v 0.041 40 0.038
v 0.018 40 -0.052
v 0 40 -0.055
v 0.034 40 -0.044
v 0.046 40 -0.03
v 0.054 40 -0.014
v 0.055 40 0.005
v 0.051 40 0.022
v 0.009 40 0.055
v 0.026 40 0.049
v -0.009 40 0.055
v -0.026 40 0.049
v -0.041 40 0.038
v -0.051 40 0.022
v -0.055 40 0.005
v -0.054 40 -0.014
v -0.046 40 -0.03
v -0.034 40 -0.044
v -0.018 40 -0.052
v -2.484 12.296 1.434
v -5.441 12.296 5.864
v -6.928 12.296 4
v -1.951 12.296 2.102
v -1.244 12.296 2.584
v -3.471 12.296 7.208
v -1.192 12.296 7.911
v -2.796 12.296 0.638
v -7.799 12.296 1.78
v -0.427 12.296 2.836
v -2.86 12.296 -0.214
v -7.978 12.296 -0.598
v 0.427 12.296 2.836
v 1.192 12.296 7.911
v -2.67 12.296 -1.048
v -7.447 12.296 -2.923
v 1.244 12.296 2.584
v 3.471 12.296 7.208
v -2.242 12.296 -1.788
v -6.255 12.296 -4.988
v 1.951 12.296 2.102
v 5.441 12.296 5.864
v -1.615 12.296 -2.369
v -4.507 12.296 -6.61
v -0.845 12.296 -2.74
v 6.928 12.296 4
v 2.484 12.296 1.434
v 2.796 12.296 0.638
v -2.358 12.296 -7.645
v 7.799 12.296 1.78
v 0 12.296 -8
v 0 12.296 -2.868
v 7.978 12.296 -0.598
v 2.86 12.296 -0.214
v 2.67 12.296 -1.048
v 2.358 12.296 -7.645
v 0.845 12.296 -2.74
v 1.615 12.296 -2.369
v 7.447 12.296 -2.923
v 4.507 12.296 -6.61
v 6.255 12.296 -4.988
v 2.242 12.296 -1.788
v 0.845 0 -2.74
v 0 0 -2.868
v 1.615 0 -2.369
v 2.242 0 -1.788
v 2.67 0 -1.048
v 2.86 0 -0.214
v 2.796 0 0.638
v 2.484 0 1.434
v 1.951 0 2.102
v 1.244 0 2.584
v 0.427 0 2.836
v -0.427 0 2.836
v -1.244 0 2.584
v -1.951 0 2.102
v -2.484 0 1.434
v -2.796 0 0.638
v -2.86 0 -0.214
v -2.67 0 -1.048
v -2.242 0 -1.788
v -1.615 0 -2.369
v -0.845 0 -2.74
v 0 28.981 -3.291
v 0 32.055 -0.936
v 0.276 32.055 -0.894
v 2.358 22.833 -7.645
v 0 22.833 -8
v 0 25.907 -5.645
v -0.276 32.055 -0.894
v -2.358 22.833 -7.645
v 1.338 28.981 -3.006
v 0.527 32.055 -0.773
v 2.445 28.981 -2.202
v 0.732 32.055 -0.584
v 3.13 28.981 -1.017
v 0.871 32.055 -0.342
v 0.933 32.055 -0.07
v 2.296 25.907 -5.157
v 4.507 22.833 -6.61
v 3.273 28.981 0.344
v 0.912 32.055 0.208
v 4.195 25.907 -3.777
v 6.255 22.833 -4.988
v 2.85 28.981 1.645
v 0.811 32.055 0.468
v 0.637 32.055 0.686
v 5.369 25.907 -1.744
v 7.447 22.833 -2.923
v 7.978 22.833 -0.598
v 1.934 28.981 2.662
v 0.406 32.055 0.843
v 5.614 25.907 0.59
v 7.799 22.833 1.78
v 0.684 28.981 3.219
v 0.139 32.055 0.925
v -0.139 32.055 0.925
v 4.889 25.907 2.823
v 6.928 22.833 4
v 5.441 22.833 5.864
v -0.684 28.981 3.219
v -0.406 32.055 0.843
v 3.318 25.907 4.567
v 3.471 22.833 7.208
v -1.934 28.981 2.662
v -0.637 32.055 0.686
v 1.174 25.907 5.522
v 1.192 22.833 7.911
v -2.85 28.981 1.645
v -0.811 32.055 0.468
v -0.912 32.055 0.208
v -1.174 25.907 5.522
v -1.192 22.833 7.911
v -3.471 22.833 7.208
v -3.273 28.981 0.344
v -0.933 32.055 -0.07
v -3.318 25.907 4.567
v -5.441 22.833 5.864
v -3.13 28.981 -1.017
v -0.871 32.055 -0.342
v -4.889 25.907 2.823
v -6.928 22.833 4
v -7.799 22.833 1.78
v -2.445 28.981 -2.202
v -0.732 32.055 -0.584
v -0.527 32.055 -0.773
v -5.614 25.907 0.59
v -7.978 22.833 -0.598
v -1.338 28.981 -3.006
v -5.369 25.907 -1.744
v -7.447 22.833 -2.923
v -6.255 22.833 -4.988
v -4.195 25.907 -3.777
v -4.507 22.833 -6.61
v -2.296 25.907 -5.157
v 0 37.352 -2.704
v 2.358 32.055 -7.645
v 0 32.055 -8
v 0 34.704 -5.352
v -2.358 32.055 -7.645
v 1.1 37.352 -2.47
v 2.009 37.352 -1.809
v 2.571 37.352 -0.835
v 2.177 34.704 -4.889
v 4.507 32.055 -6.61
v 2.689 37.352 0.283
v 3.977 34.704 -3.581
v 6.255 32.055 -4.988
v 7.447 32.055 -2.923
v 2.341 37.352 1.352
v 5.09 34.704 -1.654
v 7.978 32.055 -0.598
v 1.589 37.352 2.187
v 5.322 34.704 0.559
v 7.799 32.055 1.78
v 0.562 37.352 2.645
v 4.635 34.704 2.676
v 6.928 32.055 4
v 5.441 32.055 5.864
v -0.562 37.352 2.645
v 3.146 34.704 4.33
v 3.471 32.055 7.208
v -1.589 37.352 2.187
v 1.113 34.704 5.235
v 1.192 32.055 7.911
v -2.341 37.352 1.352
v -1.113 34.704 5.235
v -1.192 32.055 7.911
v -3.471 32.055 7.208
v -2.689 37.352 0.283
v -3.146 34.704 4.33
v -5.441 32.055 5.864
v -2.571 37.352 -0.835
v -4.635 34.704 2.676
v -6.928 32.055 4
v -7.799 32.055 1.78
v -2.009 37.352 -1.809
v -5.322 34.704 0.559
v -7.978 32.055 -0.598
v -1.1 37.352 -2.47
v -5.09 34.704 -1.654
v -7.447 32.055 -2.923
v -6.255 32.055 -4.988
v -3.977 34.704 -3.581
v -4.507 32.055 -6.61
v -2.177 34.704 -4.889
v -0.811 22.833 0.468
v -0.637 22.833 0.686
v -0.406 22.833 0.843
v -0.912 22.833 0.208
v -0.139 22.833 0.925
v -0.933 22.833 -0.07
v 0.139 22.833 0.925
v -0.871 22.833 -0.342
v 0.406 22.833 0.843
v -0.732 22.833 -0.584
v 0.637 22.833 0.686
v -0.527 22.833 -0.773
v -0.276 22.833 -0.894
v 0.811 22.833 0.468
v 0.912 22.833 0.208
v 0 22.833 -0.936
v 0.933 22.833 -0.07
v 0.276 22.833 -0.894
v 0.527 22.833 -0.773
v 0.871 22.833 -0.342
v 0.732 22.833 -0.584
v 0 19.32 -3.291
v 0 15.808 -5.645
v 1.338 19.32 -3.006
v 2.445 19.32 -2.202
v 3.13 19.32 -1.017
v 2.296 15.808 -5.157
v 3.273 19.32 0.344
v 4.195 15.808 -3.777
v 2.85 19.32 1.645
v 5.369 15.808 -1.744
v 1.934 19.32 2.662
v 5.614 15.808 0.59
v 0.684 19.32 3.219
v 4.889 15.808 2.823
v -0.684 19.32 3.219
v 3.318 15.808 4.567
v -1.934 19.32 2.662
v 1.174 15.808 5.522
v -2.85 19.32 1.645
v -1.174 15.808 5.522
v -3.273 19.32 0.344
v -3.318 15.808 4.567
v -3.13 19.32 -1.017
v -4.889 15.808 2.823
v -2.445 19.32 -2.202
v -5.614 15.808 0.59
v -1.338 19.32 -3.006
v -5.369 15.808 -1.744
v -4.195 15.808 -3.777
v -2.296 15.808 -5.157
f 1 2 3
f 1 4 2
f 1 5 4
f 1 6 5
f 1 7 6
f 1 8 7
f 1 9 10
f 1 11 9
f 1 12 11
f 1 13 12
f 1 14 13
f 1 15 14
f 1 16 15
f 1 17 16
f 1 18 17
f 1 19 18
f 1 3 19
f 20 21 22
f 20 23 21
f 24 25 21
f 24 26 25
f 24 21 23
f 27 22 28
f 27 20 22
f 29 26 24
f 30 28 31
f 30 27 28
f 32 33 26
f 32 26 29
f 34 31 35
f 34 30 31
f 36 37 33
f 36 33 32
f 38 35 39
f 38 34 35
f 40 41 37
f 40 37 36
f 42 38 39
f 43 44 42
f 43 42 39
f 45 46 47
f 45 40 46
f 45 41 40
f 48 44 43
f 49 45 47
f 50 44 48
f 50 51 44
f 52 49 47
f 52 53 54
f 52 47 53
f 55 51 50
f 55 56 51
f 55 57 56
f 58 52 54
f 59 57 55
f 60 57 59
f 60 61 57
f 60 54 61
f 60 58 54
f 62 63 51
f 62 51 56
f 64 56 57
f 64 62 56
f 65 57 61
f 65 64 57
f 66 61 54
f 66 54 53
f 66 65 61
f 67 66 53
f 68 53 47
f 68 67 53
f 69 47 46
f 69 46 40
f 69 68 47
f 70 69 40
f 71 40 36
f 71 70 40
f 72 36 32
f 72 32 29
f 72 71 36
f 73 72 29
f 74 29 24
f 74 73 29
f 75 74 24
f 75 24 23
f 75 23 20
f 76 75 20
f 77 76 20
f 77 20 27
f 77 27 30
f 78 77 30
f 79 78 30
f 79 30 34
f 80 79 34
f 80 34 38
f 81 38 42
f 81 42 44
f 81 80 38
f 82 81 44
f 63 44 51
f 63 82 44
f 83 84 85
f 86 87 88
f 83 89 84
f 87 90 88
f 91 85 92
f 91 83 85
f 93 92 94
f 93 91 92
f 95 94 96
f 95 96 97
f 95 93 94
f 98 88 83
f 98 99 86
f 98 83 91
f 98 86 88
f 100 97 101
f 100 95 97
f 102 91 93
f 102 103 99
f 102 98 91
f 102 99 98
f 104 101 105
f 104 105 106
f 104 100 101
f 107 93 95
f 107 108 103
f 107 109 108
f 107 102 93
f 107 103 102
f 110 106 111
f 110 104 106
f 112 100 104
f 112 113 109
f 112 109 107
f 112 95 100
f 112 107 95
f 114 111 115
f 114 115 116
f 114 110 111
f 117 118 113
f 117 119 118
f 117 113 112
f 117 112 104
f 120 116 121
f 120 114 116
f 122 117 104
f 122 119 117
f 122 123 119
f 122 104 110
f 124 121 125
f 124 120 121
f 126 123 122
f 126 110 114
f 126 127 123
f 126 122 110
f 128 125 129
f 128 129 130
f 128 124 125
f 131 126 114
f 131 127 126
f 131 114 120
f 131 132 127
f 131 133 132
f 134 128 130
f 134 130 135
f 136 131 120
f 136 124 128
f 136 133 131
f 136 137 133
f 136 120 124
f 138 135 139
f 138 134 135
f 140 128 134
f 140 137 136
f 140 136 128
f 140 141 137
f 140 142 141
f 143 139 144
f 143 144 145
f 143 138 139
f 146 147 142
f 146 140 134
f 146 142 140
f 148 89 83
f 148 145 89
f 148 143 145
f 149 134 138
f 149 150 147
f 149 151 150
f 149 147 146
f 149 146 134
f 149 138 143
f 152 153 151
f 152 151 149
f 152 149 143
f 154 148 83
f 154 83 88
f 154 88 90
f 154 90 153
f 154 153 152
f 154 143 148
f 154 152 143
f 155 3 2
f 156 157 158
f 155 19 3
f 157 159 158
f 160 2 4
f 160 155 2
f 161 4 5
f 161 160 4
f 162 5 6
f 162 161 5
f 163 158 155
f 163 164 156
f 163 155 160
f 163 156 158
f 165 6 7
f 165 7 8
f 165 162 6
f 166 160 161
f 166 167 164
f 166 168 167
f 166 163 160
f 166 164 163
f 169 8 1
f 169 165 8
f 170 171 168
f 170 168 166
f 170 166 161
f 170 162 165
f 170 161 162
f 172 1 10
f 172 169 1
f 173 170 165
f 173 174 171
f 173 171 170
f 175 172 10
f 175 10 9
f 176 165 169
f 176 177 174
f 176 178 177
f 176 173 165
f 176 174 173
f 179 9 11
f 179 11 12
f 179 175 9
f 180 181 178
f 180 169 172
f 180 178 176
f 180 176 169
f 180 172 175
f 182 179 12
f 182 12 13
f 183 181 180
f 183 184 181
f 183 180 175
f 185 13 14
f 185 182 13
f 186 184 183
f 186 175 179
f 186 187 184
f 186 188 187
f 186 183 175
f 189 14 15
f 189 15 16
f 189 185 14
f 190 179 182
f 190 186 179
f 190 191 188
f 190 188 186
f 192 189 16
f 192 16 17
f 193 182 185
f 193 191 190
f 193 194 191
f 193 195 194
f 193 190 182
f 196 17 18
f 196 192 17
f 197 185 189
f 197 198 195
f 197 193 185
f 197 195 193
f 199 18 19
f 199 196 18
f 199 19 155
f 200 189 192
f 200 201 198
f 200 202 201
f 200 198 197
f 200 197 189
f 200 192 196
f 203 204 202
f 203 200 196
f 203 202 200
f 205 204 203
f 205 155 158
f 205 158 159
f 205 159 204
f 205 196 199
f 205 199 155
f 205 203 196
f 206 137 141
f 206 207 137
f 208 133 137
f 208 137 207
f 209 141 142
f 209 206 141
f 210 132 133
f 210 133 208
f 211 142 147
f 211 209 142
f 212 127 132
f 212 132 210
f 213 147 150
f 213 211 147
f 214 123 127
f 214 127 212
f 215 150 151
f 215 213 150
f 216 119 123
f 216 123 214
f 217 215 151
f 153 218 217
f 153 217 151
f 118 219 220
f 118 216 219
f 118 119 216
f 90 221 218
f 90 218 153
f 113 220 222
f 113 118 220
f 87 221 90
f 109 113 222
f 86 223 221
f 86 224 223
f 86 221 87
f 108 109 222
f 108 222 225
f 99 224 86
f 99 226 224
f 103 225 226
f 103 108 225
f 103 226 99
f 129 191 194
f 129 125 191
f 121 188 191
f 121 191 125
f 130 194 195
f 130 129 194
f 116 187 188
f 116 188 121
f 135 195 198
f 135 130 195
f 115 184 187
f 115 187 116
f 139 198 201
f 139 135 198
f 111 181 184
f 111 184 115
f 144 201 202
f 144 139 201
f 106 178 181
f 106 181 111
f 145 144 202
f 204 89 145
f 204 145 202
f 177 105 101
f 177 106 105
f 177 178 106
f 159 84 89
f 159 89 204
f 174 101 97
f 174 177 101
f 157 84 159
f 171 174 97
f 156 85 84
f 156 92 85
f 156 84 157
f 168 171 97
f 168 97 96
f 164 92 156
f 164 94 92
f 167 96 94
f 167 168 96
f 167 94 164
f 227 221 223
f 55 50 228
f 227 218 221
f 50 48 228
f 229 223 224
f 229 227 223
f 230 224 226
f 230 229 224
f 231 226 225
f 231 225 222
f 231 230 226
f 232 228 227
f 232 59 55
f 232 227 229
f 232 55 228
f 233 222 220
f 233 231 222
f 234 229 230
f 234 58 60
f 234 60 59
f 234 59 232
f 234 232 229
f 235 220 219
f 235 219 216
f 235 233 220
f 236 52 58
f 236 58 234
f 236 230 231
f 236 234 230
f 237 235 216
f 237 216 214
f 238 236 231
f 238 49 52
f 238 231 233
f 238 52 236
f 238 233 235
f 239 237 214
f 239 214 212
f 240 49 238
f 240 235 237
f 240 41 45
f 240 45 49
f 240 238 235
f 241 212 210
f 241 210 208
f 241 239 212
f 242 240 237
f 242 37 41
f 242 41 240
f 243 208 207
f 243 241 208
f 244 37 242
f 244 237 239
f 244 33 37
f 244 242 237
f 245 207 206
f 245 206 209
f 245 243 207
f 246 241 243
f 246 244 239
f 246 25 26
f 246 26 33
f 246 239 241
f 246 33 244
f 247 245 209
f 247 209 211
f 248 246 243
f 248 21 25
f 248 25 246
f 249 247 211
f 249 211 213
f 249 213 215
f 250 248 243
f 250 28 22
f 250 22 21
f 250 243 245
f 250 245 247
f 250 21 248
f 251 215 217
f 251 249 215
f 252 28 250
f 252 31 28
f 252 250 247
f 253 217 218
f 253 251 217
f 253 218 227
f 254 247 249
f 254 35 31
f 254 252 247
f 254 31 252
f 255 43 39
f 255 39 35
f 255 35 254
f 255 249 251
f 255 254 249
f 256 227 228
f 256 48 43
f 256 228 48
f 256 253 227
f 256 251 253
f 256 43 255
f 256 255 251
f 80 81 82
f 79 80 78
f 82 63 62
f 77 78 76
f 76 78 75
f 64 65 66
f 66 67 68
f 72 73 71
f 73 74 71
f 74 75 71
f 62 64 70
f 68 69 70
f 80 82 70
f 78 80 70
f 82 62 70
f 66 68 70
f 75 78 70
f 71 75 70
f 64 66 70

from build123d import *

# Parameters (mm, degrees)
SKETCH_1_R      = 8
EXTRUDE_1_DEPTH = 40


with BuildPart() as part:
    # 草图1 → 凸台-拉伸1 (new body)
    with BuildSketch(Plane(origin=(0, 0, 0), x_dir=(1, 0, 0), z_dir=(0, 1, 0))):
        with Locations(Location((0, 0, 0), (0, 0, 270))):
            Circle(SKETCH_1_R)
    extrude(amount=EXTRUDE_1_DEPTH)

    # 草图2 → 切除-旋转1 (revolve, cut)
    with BuildSketch(Plane(origin=(0, 0, 0), x_dir=(0, 0, -1), z_dir=(1, 0, 0)), mode=Mode.PRIVATE) as cut_revolve_1_sk:
        Polygon((-0.055370982, 40), (-8, 32.055370982), (-0.935929442, 32.055370982), (-8, 22.83286128), (-0.935929442, 22.83286128), (-8, 12.295716869), (-2.86773925, 12.295716869), (-2.86773925, -1.226951792), (-16.741646059, 0.704858016), (-12.965835978, 40), (-8.83878775, 42.326578441), align=None)
    revolve(cut_revolve_1_sk.sketch.rotate(Axis((0, 40, 0), (0, -1, 0)), 180), axis=Axis((0, 40, 0), (0, -1, 0)), mode=Mode.SUBTRACT)


solid = part.part
